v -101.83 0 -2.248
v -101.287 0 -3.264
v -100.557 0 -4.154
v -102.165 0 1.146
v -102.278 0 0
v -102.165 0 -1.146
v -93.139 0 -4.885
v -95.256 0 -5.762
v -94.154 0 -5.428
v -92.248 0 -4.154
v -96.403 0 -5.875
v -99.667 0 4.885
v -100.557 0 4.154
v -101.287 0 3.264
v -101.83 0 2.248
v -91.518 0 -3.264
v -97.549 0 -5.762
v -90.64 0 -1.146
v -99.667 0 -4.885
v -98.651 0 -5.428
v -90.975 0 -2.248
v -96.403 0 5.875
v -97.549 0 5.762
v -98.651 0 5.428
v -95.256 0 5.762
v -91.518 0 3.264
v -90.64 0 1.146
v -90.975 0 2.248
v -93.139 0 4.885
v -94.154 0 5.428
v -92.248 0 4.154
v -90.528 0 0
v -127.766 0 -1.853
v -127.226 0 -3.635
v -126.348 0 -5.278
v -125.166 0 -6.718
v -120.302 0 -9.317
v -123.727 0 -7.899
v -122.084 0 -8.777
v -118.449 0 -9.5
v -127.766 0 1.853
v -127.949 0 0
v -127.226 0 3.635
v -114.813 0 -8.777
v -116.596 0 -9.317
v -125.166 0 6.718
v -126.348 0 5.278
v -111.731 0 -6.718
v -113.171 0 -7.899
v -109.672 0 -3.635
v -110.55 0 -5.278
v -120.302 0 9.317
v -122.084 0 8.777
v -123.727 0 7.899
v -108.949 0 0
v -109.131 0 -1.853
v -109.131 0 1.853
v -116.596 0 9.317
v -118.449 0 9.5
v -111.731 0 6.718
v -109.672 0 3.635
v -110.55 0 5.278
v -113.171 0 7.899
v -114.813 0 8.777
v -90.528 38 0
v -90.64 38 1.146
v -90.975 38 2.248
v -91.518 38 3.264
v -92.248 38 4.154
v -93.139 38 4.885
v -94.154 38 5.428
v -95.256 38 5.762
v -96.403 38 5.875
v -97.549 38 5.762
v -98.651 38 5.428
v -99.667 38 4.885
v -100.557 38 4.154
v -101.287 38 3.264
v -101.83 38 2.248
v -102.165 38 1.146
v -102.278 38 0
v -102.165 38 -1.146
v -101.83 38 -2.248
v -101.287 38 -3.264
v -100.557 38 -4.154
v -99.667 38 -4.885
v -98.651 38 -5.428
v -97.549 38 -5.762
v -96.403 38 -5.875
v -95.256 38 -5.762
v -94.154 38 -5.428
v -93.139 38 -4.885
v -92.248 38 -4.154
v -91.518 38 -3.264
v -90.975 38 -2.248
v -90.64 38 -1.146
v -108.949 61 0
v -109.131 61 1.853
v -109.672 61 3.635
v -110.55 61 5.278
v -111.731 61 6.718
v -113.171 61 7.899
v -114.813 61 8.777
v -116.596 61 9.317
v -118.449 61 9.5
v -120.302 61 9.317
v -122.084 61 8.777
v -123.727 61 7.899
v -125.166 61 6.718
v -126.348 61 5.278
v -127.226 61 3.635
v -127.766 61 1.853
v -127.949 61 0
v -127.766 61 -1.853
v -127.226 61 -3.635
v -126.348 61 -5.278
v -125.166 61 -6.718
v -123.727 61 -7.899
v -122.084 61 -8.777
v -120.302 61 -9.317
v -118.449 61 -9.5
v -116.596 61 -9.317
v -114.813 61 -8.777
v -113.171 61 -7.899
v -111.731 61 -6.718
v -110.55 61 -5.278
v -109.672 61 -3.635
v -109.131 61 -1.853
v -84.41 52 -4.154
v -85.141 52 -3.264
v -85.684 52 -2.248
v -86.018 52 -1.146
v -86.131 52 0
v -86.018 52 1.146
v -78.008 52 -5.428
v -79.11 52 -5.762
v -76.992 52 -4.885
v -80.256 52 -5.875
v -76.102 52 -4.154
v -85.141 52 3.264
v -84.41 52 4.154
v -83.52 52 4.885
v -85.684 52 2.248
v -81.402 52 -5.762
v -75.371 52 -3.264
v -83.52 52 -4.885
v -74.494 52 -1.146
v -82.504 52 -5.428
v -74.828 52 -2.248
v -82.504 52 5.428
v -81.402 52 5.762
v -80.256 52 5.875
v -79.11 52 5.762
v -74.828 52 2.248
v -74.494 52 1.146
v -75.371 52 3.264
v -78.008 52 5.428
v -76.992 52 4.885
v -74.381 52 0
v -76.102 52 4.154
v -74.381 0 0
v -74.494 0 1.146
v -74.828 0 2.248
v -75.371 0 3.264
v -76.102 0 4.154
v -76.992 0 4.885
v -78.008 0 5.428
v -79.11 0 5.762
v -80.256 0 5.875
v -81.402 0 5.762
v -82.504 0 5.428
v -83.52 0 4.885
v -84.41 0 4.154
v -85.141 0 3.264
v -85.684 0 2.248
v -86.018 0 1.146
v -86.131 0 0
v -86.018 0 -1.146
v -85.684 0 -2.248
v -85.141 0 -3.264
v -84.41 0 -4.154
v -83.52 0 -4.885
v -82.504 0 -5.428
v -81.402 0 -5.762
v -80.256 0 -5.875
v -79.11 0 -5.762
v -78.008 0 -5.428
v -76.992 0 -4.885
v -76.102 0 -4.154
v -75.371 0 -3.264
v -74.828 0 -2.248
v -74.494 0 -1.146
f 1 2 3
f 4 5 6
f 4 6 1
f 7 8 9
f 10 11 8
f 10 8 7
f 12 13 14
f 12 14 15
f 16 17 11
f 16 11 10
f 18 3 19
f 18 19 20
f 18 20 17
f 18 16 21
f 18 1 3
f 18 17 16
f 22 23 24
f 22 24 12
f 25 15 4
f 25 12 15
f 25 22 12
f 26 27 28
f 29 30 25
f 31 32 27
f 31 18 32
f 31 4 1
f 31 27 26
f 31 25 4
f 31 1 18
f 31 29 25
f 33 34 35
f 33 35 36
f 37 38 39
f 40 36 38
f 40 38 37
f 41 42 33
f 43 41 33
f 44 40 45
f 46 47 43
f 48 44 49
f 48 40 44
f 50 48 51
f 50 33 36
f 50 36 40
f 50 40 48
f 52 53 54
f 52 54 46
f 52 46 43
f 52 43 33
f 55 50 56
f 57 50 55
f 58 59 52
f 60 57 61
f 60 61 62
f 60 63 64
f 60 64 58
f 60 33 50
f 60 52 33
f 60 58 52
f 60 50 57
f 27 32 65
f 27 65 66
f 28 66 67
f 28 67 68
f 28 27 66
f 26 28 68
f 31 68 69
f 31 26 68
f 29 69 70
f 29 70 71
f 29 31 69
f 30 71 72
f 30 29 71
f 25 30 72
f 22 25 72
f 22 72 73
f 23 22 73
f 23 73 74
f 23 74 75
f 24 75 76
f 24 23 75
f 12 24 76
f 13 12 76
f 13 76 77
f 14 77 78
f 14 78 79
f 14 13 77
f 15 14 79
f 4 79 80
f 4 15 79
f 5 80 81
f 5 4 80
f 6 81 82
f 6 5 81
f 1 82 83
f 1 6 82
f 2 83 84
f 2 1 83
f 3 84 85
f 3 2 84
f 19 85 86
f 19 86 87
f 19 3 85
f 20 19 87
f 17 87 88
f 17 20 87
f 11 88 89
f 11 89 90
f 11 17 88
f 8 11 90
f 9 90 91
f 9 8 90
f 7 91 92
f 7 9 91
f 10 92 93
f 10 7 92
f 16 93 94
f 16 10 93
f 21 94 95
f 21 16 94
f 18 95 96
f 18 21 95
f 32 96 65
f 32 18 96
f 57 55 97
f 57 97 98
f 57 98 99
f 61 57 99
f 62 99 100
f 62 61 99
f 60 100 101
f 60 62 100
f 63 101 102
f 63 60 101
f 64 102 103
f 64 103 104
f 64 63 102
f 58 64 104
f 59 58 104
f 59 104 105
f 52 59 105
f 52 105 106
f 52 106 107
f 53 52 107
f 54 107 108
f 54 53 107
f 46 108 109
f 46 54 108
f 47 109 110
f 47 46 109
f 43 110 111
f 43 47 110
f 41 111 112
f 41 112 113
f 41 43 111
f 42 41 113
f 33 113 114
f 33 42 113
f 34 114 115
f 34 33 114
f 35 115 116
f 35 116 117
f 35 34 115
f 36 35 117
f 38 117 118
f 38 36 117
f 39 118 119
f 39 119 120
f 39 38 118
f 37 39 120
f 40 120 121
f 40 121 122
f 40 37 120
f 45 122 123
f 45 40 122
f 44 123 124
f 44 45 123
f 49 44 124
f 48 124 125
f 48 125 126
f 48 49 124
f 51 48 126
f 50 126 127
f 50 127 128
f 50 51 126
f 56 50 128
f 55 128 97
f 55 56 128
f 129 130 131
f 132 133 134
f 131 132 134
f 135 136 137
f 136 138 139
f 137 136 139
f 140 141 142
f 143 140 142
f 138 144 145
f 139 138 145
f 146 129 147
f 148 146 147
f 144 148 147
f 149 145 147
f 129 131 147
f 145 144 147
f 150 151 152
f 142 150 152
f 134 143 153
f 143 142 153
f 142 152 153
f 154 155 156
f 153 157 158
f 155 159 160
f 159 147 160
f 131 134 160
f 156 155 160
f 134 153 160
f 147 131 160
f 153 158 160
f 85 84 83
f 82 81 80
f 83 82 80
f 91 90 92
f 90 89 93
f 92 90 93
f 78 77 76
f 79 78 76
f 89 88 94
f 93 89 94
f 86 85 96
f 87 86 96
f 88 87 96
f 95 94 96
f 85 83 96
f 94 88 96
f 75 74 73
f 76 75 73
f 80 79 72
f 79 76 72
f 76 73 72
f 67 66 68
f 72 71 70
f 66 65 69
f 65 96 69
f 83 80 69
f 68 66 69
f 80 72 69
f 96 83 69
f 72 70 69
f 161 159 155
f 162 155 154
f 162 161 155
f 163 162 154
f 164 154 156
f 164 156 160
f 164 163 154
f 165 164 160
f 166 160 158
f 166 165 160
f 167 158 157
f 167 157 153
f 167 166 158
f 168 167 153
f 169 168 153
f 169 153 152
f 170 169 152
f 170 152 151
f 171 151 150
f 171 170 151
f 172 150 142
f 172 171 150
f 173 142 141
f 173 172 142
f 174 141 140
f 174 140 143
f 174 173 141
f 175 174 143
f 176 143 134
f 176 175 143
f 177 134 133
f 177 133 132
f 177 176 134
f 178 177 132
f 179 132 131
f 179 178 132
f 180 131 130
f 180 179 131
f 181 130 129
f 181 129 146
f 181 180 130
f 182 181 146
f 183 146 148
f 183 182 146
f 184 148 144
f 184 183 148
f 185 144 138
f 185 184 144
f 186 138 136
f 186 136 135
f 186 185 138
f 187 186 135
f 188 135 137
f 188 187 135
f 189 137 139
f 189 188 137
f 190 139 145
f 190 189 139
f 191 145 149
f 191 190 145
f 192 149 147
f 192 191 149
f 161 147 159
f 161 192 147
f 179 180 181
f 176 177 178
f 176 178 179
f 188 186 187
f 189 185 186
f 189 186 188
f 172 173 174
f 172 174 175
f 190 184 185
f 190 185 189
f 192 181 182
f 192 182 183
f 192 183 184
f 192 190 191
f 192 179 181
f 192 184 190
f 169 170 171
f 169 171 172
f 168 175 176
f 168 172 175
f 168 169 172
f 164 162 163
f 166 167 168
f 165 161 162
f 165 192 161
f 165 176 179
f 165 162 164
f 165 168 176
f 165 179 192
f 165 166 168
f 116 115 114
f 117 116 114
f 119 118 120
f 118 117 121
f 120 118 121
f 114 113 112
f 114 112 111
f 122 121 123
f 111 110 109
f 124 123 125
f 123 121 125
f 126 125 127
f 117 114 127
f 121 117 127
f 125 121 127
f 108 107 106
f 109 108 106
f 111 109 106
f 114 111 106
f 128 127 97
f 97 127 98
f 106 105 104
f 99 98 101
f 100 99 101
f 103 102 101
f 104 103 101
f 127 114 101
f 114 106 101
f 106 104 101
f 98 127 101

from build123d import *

# Parameters (mm, degrees)
F0_R     = 9.5
F1_DEPTH = 61
F0_R_2   = 5.875
F2_DEPTH = 38
F3_DEPTH = 52


with BuildPart() as f1:
    # F0 (on Front) → F1 (new body)
    with BuildSketch(Plane.XZ):
        with Locations((-118.448913, 0)):
            Circle(F0_R)
    extrude(amount=-F1_DEPTH)


with BuildPart() as f2:
    # F0 (on Front) → F2 (new body)
    with BuildSketch(Plane.XZ):
        with Locations((-96.402548, 0)):
            Circle(F0_R_2)
    extrude(amount=-F2_DEPTH)


with BuildPart() as f3:
    # F0 (on Front) → F3 (new body)
    with BuildSketch(Plane.XZ):
        with Locations((-80.255784, 0)):
            Circle(F0_R_2)
    extrude(amount=-F3_DEPTH)


solid = Compound([f1.part, f2.part, f3.part])
